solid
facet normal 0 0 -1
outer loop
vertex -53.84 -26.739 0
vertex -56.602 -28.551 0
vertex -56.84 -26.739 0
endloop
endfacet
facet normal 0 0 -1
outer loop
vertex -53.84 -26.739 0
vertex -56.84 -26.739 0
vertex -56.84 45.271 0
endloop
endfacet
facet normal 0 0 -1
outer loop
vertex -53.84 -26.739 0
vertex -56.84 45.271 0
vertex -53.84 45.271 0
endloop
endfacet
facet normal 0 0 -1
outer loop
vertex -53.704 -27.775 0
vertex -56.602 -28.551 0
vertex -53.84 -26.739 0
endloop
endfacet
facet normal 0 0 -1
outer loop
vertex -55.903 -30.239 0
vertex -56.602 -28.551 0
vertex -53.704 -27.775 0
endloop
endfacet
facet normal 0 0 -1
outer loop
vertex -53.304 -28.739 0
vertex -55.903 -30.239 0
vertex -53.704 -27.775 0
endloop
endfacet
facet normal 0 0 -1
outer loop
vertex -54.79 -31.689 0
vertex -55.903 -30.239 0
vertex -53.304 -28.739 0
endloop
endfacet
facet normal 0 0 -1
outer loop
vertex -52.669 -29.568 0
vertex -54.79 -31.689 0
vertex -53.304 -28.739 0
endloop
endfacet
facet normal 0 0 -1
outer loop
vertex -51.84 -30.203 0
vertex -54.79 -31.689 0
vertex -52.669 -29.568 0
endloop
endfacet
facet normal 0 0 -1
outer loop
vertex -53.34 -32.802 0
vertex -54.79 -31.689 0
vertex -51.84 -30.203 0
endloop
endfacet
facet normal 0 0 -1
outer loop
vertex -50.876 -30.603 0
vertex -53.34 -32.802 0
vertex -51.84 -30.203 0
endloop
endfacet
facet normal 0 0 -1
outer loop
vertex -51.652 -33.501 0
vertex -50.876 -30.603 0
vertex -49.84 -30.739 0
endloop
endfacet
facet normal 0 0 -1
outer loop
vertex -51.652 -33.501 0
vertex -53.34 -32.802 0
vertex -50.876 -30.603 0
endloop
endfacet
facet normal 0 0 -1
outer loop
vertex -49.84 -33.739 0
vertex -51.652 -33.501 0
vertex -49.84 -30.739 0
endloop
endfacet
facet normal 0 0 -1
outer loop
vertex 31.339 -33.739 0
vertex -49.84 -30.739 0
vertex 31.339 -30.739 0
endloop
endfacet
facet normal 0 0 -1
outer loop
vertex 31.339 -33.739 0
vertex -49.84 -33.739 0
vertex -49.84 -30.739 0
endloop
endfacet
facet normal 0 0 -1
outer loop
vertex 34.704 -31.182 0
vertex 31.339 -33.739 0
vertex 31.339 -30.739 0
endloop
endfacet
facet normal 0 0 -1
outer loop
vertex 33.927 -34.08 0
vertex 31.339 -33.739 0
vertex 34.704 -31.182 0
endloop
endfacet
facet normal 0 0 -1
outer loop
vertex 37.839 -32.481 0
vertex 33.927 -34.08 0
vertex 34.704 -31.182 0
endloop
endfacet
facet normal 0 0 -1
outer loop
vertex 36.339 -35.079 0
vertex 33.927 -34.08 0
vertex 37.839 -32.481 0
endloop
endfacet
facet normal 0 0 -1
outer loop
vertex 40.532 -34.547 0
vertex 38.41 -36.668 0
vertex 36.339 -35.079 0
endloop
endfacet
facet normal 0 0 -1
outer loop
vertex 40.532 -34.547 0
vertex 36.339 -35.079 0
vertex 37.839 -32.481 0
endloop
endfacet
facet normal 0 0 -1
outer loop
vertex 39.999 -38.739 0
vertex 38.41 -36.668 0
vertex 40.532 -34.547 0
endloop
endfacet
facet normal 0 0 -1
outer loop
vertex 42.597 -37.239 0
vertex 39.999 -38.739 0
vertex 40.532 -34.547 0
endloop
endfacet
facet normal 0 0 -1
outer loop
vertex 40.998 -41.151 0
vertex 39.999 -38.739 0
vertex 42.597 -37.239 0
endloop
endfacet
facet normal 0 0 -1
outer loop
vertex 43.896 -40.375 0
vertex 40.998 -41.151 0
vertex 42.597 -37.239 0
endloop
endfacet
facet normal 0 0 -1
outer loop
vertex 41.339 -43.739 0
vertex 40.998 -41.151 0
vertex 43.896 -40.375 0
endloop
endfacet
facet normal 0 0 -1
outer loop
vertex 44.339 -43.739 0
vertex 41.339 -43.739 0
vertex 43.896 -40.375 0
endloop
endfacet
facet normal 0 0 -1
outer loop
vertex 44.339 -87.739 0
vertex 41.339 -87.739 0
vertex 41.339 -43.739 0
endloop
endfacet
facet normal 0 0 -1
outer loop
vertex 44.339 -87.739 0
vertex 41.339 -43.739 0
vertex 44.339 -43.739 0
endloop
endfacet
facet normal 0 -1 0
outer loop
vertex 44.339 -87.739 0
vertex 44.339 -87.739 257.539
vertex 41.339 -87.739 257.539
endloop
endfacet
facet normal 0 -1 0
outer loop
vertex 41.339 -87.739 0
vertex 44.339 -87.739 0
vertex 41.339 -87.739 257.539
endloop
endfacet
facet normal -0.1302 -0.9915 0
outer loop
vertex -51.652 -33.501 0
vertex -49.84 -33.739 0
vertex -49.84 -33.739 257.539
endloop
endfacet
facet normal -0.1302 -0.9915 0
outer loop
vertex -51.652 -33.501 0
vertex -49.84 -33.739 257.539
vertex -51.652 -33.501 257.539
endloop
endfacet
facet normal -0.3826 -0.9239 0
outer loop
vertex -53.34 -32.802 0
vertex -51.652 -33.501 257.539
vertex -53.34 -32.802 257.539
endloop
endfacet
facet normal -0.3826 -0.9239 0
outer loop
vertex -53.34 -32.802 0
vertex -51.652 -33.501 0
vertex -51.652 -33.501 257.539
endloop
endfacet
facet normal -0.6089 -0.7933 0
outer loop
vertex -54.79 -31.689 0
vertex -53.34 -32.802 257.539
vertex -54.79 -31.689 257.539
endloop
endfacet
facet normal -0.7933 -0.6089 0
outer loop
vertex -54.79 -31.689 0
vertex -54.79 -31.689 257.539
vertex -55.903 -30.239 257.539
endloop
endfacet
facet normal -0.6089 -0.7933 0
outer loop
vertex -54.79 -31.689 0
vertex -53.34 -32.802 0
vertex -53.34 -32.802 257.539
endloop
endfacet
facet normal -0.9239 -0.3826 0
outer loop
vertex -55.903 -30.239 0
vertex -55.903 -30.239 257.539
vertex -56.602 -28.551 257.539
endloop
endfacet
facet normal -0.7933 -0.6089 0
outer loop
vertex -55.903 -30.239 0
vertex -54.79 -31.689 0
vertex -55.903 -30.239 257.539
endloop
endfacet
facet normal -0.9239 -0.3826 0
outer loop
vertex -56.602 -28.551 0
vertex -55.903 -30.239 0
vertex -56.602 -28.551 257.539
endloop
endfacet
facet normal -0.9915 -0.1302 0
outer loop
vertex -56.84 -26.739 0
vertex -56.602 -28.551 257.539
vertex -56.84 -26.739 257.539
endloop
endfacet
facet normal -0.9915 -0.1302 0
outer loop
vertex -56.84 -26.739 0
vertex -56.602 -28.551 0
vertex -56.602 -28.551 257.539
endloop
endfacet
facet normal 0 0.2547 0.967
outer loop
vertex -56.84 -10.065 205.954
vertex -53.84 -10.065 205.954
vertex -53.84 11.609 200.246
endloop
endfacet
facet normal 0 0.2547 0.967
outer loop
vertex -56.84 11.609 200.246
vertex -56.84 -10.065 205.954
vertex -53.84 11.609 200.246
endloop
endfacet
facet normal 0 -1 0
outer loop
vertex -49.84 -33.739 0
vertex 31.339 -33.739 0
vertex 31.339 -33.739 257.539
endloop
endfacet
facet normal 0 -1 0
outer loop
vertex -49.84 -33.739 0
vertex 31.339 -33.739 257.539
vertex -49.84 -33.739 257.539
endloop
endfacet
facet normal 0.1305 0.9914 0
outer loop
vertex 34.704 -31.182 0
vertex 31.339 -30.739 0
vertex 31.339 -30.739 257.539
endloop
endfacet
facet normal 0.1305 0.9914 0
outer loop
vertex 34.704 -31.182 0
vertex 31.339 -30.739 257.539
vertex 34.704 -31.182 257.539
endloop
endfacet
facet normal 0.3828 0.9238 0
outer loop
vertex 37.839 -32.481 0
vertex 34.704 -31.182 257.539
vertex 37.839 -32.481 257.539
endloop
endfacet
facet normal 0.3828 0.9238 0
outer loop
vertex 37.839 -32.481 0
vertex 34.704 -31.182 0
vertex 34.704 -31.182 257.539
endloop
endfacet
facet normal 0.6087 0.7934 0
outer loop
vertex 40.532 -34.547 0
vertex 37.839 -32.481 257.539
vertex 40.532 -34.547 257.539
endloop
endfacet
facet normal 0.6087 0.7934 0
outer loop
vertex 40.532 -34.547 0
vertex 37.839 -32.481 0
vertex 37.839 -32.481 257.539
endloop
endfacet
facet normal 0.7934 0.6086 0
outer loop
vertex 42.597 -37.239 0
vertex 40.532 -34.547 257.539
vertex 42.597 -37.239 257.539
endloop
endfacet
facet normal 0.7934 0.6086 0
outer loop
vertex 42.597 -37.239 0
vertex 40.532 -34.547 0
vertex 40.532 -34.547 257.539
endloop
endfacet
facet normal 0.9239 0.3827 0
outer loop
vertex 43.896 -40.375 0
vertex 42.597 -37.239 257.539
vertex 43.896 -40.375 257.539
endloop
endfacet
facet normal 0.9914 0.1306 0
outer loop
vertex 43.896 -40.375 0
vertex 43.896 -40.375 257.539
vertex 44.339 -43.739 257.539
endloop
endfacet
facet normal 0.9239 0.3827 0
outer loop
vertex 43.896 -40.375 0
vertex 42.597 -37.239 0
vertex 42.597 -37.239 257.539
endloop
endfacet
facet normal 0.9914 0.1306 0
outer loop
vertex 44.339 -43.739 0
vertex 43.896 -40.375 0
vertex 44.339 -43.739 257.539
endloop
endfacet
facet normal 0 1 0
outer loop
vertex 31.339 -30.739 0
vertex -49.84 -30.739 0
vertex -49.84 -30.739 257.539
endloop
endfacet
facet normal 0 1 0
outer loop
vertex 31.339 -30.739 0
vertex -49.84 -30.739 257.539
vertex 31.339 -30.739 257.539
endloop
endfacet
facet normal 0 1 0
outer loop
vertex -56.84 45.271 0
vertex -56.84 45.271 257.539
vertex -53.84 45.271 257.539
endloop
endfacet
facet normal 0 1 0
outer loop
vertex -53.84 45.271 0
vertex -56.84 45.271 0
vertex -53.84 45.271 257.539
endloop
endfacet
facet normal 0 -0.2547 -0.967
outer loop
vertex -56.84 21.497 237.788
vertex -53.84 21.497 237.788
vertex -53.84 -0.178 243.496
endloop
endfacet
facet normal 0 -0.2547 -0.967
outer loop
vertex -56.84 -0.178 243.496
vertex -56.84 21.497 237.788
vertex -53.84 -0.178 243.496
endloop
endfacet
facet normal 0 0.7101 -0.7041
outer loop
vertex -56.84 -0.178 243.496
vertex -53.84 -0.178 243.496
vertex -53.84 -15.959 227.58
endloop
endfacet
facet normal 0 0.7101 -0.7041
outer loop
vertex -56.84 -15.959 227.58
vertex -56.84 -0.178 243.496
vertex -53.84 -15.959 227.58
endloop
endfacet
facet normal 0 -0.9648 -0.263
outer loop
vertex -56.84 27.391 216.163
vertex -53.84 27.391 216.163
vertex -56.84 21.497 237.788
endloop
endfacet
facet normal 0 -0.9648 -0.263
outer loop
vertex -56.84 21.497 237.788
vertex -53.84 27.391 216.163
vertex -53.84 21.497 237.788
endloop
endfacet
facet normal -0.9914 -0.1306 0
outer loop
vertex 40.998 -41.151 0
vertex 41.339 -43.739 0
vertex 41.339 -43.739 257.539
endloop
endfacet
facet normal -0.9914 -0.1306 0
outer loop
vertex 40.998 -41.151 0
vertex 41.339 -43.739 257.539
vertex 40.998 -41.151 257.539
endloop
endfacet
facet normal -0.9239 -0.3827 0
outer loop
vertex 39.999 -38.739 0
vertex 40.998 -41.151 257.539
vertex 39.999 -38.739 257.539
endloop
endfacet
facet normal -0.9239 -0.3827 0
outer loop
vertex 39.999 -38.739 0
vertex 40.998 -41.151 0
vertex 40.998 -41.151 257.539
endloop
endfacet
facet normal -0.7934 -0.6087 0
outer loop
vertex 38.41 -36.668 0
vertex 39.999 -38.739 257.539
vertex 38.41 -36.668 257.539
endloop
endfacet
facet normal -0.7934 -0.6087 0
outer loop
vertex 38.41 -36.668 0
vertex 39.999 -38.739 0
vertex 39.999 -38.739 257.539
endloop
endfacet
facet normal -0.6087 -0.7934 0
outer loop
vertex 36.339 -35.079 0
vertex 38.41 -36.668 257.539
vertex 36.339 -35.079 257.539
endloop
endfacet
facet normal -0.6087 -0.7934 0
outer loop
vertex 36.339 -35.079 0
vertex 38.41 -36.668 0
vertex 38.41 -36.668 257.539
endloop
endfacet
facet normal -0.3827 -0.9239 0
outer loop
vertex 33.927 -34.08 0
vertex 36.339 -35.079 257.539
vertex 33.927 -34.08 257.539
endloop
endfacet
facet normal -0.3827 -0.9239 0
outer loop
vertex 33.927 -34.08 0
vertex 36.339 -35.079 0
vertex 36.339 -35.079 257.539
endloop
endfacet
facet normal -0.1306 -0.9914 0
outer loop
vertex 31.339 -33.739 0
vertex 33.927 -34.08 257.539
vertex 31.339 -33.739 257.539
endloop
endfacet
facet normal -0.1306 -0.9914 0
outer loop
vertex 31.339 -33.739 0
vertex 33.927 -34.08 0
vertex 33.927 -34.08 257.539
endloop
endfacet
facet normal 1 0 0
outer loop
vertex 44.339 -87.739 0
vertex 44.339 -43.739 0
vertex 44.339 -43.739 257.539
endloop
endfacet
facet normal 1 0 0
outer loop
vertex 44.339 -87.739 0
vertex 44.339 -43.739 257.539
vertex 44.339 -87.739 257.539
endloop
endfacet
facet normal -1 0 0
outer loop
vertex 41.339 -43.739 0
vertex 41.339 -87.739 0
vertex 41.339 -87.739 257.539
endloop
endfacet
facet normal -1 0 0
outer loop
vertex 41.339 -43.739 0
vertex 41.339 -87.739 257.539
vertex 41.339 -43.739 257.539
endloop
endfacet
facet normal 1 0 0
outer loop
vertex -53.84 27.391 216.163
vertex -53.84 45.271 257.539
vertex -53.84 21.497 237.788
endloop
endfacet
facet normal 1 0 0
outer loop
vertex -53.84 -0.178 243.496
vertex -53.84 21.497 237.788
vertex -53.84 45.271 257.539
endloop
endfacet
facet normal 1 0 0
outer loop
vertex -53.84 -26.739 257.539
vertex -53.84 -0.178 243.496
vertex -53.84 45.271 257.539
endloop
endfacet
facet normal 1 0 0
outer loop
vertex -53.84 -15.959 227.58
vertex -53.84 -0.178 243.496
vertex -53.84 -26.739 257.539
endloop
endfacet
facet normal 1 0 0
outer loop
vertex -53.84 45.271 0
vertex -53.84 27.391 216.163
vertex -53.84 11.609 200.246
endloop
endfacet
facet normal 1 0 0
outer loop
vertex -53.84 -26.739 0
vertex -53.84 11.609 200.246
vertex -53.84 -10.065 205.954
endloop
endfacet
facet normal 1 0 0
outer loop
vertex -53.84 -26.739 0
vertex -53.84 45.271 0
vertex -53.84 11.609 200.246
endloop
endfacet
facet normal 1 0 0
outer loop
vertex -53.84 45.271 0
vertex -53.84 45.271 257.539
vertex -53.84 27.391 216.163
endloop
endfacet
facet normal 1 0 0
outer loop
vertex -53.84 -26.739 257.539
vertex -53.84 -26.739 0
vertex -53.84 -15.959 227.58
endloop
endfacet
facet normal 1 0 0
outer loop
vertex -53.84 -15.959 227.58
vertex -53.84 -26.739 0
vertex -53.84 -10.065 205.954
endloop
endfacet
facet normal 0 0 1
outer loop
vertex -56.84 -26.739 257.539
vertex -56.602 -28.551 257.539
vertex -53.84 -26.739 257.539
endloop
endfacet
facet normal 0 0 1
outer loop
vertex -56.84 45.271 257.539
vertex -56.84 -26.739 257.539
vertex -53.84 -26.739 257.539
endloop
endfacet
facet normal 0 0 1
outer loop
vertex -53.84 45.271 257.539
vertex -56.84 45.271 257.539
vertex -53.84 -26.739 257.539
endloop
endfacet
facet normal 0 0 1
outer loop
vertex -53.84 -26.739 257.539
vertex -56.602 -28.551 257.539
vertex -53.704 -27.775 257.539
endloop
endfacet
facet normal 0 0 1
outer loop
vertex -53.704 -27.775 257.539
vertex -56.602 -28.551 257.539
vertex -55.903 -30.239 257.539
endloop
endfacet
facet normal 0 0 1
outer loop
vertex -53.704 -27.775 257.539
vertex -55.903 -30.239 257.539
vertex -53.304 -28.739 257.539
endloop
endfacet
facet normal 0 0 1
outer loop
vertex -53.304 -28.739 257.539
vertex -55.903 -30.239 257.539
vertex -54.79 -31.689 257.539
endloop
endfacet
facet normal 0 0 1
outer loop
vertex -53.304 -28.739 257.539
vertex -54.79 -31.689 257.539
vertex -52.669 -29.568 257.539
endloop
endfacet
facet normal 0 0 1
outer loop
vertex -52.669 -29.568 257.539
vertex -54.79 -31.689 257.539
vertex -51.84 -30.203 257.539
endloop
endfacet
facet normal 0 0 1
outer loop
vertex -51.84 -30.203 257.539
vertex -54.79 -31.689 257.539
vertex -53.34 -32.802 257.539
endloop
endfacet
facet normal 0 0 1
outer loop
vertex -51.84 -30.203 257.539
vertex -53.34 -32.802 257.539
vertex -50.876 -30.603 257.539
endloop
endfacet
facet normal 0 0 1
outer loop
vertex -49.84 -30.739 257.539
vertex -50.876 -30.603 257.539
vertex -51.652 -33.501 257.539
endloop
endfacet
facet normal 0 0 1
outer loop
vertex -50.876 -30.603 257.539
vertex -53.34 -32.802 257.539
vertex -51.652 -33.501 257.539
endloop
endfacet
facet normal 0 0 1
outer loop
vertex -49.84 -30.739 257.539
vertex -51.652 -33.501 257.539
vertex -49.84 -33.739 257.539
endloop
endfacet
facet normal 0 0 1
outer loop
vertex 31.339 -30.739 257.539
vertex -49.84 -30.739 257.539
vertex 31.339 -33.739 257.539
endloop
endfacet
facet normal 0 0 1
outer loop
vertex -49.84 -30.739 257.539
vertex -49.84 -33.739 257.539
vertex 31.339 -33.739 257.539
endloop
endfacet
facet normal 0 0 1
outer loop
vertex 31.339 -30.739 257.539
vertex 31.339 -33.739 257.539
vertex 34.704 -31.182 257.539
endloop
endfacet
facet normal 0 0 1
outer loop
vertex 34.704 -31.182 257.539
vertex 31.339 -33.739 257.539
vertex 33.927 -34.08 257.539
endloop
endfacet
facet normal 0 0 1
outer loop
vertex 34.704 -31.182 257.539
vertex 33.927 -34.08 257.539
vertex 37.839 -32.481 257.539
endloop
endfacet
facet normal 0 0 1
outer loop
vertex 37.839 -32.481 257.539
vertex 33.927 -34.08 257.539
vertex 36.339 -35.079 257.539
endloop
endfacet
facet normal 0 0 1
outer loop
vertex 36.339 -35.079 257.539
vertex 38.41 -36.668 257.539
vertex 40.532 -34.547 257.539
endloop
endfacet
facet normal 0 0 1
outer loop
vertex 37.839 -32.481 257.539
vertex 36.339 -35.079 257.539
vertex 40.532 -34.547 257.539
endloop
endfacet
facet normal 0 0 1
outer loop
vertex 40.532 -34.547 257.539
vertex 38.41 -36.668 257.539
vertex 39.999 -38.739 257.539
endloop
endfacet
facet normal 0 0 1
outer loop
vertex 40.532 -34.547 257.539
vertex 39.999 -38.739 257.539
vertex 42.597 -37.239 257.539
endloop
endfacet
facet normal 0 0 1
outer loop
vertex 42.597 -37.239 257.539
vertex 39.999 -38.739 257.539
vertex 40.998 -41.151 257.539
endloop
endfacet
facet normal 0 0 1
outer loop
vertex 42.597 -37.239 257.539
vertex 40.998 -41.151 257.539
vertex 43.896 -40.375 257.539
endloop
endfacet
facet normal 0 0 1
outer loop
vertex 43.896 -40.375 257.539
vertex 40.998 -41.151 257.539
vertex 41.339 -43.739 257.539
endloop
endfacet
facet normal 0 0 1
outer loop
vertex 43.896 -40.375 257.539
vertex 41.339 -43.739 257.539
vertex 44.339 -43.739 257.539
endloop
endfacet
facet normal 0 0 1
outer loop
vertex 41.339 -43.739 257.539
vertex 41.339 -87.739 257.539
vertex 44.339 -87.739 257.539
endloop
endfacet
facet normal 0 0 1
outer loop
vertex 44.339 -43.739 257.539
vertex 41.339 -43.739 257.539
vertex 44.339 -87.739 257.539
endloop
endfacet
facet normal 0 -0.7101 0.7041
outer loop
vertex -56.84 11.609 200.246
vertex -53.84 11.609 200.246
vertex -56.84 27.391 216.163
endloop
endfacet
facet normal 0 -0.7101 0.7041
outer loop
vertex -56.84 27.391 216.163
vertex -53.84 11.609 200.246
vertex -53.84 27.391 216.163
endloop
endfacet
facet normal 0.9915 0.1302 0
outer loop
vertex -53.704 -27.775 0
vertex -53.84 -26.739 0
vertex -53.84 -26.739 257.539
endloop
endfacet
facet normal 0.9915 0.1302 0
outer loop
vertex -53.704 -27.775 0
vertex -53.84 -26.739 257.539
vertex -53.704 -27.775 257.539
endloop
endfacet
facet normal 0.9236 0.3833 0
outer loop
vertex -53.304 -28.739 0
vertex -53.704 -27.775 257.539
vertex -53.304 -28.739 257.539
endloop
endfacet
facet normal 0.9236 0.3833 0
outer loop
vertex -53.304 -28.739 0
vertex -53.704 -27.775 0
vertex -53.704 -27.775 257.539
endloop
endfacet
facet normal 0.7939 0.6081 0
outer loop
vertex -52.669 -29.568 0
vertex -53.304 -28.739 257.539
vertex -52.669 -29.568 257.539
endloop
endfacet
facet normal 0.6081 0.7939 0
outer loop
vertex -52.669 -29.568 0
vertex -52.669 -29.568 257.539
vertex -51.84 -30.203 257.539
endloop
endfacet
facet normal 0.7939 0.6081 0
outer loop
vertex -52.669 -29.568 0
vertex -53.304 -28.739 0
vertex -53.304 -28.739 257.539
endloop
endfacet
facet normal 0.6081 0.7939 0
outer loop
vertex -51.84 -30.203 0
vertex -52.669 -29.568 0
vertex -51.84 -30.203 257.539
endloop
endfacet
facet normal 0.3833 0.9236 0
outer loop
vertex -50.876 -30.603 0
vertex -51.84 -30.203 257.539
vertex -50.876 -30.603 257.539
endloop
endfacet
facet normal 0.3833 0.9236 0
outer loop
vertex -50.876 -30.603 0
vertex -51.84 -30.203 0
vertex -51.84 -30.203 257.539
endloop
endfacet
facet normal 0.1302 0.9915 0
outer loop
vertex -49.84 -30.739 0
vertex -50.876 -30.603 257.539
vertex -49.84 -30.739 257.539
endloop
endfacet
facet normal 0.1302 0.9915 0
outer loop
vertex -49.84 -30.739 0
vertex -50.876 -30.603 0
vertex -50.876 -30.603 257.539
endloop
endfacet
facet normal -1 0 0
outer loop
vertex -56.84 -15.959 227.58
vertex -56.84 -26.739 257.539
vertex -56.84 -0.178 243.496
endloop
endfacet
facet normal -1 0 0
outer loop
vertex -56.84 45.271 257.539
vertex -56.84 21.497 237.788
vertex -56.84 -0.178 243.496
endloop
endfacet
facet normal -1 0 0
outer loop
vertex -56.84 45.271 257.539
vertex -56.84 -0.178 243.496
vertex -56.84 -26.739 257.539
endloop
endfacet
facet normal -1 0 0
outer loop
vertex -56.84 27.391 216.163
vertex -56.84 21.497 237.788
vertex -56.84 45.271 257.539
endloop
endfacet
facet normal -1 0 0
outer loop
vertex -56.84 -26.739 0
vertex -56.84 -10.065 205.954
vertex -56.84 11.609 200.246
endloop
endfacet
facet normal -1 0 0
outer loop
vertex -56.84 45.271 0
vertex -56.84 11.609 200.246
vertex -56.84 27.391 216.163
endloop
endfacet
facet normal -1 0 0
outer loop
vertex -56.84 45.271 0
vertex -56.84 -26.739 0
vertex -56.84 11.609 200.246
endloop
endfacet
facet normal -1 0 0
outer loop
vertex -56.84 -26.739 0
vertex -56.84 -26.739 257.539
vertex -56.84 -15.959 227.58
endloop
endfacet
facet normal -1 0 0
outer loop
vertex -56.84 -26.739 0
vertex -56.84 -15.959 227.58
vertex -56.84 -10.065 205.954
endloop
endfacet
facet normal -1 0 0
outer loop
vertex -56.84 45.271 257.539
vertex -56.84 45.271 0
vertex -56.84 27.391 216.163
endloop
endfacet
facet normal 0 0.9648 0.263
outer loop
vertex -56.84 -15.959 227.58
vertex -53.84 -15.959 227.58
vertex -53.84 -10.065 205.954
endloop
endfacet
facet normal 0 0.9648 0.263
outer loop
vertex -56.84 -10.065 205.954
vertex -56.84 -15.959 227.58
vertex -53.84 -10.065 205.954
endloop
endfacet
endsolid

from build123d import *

# Parameters (mm, degrees)
BASE_FLANGE1_DEPTH           = 257.539224292
CUT_EXTRUDE1_DEPTH           = 10
EDGE_FLANGE1_STRIP_W         = 32
EDGE_FLANGE1_STRIP_H         = 3
EDGE_FLANGE1_STRIP_CUT_DEPTH = 257.539224292
EDGE_FLANGE1_DEPTH           = 257.539224292


# Sheet-metal steps are written as plain solids
with BuildPart() as part:
    # Sketch1 → Base-Flange1 (new body)
    with BuildSketch(Plane.XY):
        with BuildLine():
            Line((-53.840389348, 45.270638794), (-53.840389348, -26.739322638))
            ThreePointArc((-53.840389348, -26.739322638), (-52.668816472, -29.567749763), (-49.840389348, -30.739322638))
            Line((-49.840389348, -30.739322638), (44.339144169, -30.739322638))
            Line((44.339144169, -30.739322638), (44.339144169, -33.739322638))
            Line((44.339144169, -33.739322638), (-49.840389348, -33.739322638))
            ThreePointArc((-49.840389348, -33.739322638), (-54.790136816, -31.689070106), (-56.840389348, -26.739322638))
            Line((-56.840389348, -26.739322638), (-56.840389348, 45.270638794))
            Line((-56.840389348, 45.270638794), (-53.840389348, 45.270638794))
        make_face()
    extrude(amount=BASE_FLANGE1_DEPTH)

    # Sketch8 → Cut-Extrude1 (cut)
    with BuildSketch(Plane(origin=(-53.840389348, 0, 0), x_dir=(0, 0, -1), z_dir=(1, 0, 0))):
        Polygon((-216.16259768, 27.390589149), (-237.787839878, 21.496921555), (-243.496395119, -0.177921348), (-227.579708162, -15.959096657), (-205.954465965, -10.065429063), (-200.245910723, 11.60941384), align=None)
    extrude(amount=-CUT_EXTRUDE1_DEPTH, mode=Mode.SUBTRACT)

    # Edge-Flange1 strip (across the edge) → Edge-Flange1 strip cut (cut)
    with BuildSketch(Plane(origin=(44.339144169, -33.739322638, 0), x_dir=(-1, 0, 0), z_dir=(0, 0, 1))):
        with Locations((-3, -1.5)):
            Rectangle(EDGE_FLANGE1_STRIP_W, EDGE_FLANGE1_STRIP_H)
    extrude(amount=EDGE_FLANGE1_STRIP_CUT_DEPTH, mode=Mode.SUBTRACT)

    # Edge-Flange1 section (across the edge) → Edge-Flange1 (add)
    with BuildSketch(Plane(origin=(44.339144169, -33.739322638, 0), x_dir=(-1, 0, 0), z_dir=(0, 0, 1))):
        with BuildLine():
            Line((0, 10), (0, 54))
            Line((0, 54), (3, 54))
            Line((3, 54), (3, 10))
            ThreePointArc((3, 10), (5.928932188, 2.928932188), (13, 0))
            Line((13, 0), (13, -3))
            ThreePointArc((13, -3), (3.807611845, 0.807611845), (0, 10))
        make_face()
    extrude(amount=EDGE_FLANGE1_DEPTH)


solid = part.part
